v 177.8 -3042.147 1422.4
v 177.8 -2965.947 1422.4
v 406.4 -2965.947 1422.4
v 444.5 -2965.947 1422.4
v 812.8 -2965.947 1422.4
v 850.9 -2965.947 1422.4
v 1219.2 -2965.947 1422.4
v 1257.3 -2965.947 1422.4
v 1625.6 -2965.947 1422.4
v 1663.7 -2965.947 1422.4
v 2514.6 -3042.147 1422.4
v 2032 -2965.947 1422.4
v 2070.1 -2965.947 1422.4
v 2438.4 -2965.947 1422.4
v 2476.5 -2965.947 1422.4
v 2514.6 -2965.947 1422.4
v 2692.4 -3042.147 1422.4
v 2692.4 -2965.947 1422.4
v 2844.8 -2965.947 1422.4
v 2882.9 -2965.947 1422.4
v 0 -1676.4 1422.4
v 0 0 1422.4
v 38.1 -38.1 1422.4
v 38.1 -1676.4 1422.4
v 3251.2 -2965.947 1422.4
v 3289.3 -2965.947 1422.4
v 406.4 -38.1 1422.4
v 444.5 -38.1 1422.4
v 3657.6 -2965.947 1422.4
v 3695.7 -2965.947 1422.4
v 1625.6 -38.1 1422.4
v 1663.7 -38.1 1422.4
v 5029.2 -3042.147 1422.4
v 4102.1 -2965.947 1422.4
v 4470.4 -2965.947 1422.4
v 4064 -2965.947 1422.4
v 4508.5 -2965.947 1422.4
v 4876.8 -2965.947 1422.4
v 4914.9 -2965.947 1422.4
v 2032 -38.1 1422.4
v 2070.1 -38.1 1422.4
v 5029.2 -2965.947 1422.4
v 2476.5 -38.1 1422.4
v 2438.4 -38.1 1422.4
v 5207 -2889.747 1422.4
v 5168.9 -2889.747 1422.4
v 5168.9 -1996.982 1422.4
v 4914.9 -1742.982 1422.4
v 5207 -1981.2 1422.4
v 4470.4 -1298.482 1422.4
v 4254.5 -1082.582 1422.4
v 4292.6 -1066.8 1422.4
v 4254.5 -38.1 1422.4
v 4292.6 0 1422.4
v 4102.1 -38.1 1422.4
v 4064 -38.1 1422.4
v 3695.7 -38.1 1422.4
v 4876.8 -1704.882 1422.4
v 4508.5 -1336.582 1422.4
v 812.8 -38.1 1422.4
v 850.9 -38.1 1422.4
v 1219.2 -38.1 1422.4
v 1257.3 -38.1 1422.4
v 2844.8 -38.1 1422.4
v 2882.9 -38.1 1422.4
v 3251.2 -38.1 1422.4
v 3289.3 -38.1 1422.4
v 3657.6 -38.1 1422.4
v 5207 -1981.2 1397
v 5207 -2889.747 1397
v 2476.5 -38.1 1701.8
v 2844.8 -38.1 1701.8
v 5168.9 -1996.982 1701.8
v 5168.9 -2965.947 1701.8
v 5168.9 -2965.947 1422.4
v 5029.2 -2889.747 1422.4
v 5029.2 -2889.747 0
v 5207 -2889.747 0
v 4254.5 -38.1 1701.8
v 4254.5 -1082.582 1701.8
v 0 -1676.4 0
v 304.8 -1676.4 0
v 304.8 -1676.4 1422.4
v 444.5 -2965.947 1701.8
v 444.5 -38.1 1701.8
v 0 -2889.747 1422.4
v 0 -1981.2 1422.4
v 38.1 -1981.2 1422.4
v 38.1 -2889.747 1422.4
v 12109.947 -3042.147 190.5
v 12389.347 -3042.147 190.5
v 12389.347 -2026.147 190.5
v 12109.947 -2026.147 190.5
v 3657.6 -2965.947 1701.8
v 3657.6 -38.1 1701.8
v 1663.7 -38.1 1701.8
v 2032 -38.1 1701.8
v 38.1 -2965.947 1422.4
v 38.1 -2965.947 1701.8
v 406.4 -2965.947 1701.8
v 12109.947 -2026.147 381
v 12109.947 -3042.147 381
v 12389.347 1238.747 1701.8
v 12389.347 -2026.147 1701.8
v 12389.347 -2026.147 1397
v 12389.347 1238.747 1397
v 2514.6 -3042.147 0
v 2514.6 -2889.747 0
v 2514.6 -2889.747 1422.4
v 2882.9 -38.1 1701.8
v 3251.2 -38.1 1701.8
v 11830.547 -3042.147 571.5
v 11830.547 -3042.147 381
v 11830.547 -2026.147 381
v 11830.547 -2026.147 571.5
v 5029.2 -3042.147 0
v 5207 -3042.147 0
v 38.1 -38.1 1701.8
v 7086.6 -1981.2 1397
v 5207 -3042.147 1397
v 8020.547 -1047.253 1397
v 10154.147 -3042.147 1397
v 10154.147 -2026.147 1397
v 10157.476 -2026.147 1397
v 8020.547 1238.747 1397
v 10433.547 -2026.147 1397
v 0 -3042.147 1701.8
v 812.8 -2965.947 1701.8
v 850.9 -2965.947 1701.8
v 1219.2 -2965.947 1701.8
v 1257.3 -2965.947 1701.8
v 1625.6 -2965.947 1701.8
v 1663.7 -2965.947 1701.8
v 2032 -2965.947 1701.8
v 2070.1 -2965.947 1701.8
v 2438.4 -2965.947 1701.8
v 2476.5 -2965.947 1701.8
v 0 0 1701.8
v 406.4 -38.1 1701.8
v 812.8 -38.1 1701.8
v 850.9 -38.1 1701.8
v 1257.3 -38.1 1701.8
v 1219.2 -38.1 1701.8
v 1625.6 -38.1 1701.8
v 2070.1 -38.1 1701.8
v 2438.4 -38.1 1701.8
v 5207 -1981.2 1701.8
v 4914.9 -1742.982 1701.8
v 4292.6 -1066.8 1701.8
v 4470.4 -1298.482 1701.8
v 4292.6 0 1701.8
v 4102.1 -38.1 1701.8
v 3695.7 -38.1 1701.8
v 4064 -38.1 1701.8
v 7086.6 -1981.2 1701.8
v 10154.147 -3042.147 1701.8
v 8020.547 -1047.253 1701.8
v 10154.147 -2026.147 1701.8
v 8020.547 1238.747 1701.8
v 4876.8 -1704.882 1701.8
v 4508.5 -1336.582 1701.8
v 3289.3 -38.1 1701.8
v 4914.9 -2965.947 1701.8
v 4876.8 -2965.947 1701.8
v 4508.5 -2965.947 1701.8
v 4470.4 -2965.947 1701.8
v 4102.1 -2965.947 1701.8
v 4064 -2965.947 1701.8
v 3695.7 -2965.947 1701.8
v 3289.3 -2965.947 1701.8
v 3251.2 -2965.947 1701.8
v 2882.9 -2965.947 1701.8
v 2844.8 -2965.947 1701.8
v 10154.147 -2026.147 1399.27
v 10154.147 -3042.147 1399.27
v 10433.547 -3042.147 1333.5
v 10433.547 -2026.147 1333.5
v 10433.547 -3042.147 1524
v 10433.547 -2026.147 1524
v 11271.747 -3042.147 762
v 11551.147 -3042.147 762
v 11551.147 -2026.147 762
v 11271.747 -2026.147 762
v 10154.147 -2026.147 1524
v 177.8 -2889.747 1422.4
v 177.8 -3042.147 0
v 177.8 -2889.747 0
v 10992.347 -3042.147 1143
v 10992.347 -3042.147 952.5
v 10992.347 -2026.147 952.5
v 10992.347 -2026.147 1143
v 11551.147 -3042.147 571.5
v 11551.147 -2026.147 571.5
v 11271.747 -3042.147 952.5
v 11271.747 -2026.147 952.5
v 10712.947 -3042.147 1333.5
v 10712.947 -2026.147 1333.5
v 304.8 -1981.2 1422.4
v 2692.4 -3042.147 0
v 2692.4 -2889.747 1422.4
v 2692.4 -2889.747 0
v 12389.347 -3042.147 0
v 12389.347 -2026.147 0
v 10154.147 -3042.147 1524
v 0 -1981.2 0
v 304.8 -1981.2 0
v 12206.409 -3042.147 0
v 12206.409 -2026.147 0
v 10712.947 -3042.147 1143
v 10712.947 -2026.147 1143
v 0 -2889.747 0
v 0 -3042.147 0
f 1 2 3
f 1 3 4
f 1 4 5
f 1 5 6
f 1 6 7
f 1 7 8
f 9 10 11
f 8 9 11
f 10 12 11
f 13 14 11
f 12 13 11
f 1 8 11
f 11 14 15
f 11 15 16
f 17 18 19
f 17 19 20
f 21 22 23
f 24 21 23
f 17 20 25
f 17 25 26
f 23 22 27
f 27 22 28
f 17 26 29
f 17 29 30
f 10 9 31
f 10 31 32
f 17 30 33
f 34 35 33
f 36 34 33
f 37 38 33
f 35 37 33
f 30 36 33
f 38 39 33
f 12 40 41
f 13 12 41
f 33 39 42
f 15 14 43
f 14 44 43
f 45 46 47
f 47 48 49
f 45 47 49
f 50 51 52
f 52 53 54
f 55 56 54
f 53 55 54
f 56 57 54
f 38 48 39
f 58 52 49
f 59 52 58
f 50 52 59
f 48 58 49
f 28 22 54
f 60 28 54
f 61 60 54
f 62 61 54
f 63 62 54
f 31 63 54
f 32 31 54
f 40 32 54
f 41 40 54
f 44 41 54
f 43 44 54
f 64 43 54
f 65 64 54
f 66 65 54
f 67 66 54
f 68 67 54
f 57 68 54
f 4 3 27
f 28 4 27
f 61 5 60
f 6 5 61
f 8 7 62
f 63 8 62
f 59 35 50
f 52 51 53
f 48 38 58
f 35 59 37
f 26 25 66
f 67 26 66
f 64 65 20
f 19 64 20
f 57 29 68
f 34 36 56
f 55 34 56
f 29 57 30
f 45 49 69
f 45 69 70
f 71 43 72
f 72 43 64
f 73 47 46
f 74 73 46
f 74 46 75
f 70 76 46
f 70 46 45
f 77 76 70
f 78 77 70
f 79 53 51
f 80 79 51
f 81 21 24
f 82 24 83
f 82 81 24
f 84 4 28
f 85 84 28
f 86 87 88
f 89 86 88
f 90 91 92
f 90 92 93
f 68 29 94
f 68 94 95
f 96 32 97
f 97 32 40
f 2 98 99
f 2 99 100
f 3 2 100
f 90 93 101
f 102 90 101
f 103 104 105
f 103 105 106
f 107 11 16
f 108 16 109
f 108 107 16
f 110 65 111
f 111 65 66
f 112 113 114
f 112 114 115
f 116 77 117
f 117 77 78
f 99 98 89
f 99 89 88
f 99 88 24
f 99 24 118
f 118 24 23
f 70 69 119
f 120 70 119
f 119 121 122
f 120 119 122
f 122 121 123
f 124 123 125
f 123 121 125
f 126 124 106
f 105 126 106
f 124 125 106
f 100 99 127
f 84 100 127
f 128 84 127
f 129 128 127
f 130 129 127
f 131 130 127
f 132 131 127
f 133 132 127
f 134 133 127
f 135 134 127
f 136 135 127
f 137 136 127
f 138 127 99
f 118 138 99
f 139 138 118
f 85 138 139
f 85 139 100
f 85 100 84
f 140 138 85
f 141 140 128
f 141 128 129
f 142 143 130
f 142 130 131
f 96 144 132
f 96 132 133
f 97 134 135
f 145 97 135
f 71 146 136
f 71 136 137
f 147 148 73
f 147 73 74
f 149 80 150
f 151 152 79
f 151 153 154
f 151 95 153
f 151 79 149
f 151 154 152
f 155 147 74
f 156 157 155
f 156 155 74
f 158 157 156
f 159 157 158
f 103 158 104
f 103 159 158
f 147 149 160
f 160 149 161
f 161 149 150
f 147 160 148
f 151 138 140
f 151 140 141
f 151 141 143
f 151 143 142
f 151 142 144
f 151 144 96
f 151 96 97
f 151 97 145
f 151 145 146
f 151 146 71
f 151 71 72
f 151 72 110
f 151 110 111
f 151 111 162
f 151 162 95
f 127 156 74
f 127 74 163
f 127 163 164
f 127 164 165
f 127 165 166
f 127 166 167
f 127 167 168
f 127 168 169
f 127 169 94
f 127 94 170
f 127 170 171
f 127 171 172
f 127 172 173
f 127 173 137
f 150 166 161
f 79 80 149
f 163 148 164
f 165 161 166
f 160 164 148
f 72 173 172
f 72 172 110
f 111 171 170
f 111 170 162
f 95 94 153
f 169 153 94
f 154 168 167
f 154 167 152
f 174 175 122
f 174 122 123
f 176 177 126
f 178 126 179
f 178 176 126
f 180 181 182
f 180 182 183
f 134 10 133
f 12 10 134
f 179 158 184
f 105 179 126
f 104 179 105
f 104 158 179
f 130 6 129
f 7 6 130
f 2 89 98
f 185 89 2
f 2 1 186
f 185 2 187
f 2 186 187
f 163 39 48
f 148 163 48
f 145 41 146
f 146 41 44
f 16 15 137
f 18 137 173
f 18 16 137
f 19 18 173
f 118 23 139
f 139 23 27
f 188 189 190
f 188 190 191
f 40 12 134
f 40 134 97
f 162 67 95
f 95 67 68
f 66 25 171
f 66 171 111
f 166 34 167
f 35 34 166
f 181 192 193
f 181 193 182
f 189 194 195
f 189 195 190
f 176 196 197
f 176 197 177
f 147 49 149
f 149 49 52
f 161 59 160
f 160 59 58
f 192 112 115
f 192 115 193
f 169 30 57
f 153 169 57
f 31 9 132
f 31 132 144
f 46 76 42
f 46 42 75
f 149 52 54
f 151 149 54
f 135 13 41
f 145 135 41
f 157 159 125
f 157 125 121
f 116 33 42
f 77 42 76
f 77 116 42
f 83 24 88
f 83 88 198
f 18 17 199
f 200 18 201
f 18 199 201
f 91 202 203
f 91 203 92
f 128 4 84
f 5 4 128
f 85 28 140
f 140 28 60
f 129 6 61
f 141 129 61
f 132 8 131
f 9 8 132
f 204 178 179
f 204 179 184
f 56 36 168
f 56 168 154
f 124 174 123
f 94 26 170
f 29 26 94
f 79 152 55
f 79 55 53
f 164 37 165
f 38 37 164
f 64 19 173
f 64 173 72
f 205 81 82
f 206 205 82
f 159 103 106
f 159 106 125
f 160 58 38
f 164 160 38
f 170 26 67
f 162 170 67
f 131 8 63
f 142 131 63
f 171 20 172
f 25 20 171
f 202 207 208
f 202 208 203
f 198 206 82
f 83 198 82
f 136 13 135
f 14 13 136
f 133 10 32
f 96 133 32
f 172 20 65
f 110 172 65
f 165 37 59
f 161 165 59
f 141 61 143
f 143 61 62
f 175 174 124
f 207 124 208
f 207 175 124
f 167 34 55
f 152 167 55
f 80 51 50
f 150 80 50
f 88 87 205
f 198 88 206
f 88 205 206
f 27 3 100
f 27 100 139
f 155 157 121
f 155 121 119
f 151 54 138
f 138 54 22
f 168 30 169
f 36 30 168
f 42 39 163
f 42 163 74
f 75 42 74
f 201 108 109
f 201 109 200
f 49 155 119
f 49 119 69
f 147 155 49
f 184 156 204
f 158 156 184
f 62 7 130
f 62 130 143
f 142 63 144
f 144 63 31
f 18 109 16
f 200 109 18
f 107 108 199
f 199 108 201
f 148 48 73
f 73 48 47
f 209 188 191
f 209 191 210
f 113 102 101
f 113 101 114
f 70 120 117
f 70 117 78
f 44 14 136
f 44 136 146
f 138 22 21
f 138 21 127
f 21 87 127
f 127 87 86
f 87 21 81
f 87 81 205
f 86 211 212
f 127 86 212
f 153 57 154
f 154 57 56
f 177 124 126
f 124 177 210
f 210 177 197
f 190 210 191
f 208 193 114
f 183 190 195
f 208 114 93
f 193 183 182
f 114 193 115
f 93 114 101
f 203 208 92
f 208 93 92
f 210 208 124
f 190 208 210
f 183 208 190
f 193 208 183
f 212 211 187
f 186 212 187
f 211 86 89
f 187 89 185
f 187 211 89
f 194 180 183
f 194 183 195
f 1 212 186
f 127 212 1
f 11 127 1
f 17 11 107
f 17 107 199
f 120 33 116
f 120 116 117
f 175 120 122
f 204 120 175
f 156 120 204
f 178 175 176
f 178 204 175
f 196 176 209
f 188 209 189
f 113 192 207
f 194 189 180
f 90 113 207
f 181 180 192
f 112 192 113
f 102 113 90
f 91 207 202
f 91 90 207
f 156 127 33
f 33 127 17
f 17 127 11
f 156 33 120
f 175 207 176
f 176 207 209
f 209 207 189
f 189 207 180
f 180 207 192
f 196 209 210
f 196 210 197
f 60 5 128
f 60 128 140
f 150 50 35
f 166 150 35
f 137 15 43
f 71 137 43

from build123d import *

# Parameters (mm, degrees)
F0_W      = 304.8
F0_H      = 304.8
F1_DEPTH  = 1422.4
F0_W_2    = 177.8
F0_H_2    = 152.4
F3_DEPTH  = 279.4
F4_W      = 5130.8
F4_H      = 38.1
F5_DEPTH  = 279.4
F6_W      = 38.1
F6_H      = 2927.8466365912
F7_DEPTH  = 279.4
F9_DEPTH  = 304.8
F10_W     = 2235.2
F10_H     = 1016
F11_DEPTH = 1701.801
F13_DEPTH = 1016


with BuildPart() as f1:
    # F0 (on Top) → F1 (new body)
    with BuildSketch(Plane.XY):
        with Locations((152.4, -1828.8)):
            Rectangle(F0_W, F0_H)
    extrude(amount=F1_DEPTH)



with BuildPart() as f1b:
    # F0 (on Top) → F1, piece 2 (new body)
    with BuildSketch(Plane.XY):
        with Locations((88.9, -2965.9466365912)):
            Rectangle(F0_W_2, F0_H_2)
    extrude(amount=F1_DEPTH)


with BuildPart() as f1c:
    # F0 (on Top) → F1, piece 3 (new body)
    with BuildSketch(Plane.XY):
        with Locations((2603.5, -2965.9466365912)):
            Rectangle(F0_W_2, F0_H_2)
    extrude(amount=F1_DEPTH)


with BuildPart() as f1d:
    # F0 (on Top) → F1, piece 4 (new body)
    with BuildSketch(Plane.XY):
        with Locations((5118.1, -2965.9466365912)):
            Rectangle(F0_W_2, F0_H_2)
    extrude(amount=F1_DEPTH)


with BuildPart() as f1_1:
    add(f1.part)

    add(f1b.part)  # F3 merges F1b

    add(f1c.part)  # F3 merges F1c

    add(f1d.part)  # F3 merges F1d
    # F2 (on face) → F3 (join)
    with BuildSketch(Plane.XY.offset(1422.4)):
        Polygon((4292.6, 0), (0, 0), (0, -3042.1466365912), (5207, -3042.1466365912), (5207, -1981.2), (4292.6, -1066.8), align=None)
        Polygon((38.1, -38.1), (4254.5, -38.1), (4254.5, -1082.5815367264), (5168.9, -1996.9815367264), (5168.9, -3004.0466365912), (38.1, -3004.0466365912), align=None, mode=Mode.SUBTRACT)
    extrude(amount=F3_DEPTH)

    # F4 (on face) → F5 (join, through all)
    with BuildSketch(Plane.XY.offset(1422.4)):
        with Locations((2603.5, -2984.9966365912)):
            Rectangle(F4_W, F4_H)
    extrude(amount=F5_DEPTH)

    # F6 (on face) → F7 (join, through all)
    with BuildSketch(Plane.XY.offset(1422.4)):
        with Locations((425.45, -1502.0233182956)):
            Rectangle(F6_W, F6_H)
        with Locations((831.85, -1502.0233182956)):
            Rectangle(F6_W, F6_H)
        with Locations((1238.25, -1502.0233182956)):
            Rectangle(F6_W, F6_H)
        with Locations((1644.65, -1502.0233182956)):
            Rectangle(F6_W, F6_H)
        with Locations((2051.05, -1502.0233182956)):
            Rectangle(F6_W, F6_H)
        with Locations((2457.45, -1502.0233182956)):
            Rectangle(F6_W, F6_H)
        with Locations((2863.85, -1502.0233182956)):
            Rectangle(F6_W, F6_H)
        with Locations((3270.25, -1502.0233182956)):
            Rectangle(F6_W, F6_H)
        with Locations((3676.65, -1502.0233182956)):
            Rectangle(F6_W, F6_H)
        with Locations((4083.05, -1502.0233182956)):
            Rectangle(F6_W, F6_H)
        Polygon((4470.4, -1298.4815367264), (4470.4, -2965.9466365912), (4508.5, -2965.9466365912), (4508.5, -1336.5815367264), align=None)
        Polygon((4876.8, -1704.8815367264), (4876.8, -2965.9466365912), (4914.9, -2965.9466365912), (4914.9, -1742.9815367264), align=None)
    extrude(amount=F7_DEPTH)

    # F8 (on face) → F9 (join)
    with BuildSketch(Plane.XY.offset(1701.8)):
        Polygon((7086.6, -1981.2), (5207, -1981.2), (5207, -3042.1466365912), (12389.3466365912, -3042.1466365912), (12389.3466365912, 1238.7466365912), (8020.5466365912, 1238.7466365912), (8020.5466365912, -1047.2533634088), align=None)
    extrude(amount=-F9_DEPTH)

    # F10 (on face) → F11 (cut, through all)
    with BuildSketch(Plane.XY.offset(1701.8)):
        with Locations((11271.7466365912, -2534.1466365912)):
            Rectangle(F10_W, F10_H)
    extrude(amount=-F11_DEPTH, mode=Mode.SUBTRACT)

    # F12 (on face) → F13 (join, through all)
    with BuildSketch(Plane.XZ.offset(3042.1466365912)):
        Polygon((10154.1466365912, 1524), (10154.1466365912, 1701.8), (9710.4358673096, 1701.8), (12206.4092006429, 0), (12389.3466365912, 0), (12389.3466365912, 190.5), (12109.9466365912, 190.5), (12109.9466365912, 381), (11830.5466365912, 381), (11830.5466365912, 571.5), (11551.1466365912, 571.5), (11551.1466365912, 762), (11271.7466365912, 762), (11271.7466365912, 952.5), (10992.3466365912, 952.5), (10992.3466365912, 1143), (10712.9466365912, 1143), (10712.9466365912, 1333.5), (10433.5466365912, 1333.5), (10433.5466365912, 1524), align=None)
    extrude(amount=-F13_DEPTH)


solid = f1_1.part
